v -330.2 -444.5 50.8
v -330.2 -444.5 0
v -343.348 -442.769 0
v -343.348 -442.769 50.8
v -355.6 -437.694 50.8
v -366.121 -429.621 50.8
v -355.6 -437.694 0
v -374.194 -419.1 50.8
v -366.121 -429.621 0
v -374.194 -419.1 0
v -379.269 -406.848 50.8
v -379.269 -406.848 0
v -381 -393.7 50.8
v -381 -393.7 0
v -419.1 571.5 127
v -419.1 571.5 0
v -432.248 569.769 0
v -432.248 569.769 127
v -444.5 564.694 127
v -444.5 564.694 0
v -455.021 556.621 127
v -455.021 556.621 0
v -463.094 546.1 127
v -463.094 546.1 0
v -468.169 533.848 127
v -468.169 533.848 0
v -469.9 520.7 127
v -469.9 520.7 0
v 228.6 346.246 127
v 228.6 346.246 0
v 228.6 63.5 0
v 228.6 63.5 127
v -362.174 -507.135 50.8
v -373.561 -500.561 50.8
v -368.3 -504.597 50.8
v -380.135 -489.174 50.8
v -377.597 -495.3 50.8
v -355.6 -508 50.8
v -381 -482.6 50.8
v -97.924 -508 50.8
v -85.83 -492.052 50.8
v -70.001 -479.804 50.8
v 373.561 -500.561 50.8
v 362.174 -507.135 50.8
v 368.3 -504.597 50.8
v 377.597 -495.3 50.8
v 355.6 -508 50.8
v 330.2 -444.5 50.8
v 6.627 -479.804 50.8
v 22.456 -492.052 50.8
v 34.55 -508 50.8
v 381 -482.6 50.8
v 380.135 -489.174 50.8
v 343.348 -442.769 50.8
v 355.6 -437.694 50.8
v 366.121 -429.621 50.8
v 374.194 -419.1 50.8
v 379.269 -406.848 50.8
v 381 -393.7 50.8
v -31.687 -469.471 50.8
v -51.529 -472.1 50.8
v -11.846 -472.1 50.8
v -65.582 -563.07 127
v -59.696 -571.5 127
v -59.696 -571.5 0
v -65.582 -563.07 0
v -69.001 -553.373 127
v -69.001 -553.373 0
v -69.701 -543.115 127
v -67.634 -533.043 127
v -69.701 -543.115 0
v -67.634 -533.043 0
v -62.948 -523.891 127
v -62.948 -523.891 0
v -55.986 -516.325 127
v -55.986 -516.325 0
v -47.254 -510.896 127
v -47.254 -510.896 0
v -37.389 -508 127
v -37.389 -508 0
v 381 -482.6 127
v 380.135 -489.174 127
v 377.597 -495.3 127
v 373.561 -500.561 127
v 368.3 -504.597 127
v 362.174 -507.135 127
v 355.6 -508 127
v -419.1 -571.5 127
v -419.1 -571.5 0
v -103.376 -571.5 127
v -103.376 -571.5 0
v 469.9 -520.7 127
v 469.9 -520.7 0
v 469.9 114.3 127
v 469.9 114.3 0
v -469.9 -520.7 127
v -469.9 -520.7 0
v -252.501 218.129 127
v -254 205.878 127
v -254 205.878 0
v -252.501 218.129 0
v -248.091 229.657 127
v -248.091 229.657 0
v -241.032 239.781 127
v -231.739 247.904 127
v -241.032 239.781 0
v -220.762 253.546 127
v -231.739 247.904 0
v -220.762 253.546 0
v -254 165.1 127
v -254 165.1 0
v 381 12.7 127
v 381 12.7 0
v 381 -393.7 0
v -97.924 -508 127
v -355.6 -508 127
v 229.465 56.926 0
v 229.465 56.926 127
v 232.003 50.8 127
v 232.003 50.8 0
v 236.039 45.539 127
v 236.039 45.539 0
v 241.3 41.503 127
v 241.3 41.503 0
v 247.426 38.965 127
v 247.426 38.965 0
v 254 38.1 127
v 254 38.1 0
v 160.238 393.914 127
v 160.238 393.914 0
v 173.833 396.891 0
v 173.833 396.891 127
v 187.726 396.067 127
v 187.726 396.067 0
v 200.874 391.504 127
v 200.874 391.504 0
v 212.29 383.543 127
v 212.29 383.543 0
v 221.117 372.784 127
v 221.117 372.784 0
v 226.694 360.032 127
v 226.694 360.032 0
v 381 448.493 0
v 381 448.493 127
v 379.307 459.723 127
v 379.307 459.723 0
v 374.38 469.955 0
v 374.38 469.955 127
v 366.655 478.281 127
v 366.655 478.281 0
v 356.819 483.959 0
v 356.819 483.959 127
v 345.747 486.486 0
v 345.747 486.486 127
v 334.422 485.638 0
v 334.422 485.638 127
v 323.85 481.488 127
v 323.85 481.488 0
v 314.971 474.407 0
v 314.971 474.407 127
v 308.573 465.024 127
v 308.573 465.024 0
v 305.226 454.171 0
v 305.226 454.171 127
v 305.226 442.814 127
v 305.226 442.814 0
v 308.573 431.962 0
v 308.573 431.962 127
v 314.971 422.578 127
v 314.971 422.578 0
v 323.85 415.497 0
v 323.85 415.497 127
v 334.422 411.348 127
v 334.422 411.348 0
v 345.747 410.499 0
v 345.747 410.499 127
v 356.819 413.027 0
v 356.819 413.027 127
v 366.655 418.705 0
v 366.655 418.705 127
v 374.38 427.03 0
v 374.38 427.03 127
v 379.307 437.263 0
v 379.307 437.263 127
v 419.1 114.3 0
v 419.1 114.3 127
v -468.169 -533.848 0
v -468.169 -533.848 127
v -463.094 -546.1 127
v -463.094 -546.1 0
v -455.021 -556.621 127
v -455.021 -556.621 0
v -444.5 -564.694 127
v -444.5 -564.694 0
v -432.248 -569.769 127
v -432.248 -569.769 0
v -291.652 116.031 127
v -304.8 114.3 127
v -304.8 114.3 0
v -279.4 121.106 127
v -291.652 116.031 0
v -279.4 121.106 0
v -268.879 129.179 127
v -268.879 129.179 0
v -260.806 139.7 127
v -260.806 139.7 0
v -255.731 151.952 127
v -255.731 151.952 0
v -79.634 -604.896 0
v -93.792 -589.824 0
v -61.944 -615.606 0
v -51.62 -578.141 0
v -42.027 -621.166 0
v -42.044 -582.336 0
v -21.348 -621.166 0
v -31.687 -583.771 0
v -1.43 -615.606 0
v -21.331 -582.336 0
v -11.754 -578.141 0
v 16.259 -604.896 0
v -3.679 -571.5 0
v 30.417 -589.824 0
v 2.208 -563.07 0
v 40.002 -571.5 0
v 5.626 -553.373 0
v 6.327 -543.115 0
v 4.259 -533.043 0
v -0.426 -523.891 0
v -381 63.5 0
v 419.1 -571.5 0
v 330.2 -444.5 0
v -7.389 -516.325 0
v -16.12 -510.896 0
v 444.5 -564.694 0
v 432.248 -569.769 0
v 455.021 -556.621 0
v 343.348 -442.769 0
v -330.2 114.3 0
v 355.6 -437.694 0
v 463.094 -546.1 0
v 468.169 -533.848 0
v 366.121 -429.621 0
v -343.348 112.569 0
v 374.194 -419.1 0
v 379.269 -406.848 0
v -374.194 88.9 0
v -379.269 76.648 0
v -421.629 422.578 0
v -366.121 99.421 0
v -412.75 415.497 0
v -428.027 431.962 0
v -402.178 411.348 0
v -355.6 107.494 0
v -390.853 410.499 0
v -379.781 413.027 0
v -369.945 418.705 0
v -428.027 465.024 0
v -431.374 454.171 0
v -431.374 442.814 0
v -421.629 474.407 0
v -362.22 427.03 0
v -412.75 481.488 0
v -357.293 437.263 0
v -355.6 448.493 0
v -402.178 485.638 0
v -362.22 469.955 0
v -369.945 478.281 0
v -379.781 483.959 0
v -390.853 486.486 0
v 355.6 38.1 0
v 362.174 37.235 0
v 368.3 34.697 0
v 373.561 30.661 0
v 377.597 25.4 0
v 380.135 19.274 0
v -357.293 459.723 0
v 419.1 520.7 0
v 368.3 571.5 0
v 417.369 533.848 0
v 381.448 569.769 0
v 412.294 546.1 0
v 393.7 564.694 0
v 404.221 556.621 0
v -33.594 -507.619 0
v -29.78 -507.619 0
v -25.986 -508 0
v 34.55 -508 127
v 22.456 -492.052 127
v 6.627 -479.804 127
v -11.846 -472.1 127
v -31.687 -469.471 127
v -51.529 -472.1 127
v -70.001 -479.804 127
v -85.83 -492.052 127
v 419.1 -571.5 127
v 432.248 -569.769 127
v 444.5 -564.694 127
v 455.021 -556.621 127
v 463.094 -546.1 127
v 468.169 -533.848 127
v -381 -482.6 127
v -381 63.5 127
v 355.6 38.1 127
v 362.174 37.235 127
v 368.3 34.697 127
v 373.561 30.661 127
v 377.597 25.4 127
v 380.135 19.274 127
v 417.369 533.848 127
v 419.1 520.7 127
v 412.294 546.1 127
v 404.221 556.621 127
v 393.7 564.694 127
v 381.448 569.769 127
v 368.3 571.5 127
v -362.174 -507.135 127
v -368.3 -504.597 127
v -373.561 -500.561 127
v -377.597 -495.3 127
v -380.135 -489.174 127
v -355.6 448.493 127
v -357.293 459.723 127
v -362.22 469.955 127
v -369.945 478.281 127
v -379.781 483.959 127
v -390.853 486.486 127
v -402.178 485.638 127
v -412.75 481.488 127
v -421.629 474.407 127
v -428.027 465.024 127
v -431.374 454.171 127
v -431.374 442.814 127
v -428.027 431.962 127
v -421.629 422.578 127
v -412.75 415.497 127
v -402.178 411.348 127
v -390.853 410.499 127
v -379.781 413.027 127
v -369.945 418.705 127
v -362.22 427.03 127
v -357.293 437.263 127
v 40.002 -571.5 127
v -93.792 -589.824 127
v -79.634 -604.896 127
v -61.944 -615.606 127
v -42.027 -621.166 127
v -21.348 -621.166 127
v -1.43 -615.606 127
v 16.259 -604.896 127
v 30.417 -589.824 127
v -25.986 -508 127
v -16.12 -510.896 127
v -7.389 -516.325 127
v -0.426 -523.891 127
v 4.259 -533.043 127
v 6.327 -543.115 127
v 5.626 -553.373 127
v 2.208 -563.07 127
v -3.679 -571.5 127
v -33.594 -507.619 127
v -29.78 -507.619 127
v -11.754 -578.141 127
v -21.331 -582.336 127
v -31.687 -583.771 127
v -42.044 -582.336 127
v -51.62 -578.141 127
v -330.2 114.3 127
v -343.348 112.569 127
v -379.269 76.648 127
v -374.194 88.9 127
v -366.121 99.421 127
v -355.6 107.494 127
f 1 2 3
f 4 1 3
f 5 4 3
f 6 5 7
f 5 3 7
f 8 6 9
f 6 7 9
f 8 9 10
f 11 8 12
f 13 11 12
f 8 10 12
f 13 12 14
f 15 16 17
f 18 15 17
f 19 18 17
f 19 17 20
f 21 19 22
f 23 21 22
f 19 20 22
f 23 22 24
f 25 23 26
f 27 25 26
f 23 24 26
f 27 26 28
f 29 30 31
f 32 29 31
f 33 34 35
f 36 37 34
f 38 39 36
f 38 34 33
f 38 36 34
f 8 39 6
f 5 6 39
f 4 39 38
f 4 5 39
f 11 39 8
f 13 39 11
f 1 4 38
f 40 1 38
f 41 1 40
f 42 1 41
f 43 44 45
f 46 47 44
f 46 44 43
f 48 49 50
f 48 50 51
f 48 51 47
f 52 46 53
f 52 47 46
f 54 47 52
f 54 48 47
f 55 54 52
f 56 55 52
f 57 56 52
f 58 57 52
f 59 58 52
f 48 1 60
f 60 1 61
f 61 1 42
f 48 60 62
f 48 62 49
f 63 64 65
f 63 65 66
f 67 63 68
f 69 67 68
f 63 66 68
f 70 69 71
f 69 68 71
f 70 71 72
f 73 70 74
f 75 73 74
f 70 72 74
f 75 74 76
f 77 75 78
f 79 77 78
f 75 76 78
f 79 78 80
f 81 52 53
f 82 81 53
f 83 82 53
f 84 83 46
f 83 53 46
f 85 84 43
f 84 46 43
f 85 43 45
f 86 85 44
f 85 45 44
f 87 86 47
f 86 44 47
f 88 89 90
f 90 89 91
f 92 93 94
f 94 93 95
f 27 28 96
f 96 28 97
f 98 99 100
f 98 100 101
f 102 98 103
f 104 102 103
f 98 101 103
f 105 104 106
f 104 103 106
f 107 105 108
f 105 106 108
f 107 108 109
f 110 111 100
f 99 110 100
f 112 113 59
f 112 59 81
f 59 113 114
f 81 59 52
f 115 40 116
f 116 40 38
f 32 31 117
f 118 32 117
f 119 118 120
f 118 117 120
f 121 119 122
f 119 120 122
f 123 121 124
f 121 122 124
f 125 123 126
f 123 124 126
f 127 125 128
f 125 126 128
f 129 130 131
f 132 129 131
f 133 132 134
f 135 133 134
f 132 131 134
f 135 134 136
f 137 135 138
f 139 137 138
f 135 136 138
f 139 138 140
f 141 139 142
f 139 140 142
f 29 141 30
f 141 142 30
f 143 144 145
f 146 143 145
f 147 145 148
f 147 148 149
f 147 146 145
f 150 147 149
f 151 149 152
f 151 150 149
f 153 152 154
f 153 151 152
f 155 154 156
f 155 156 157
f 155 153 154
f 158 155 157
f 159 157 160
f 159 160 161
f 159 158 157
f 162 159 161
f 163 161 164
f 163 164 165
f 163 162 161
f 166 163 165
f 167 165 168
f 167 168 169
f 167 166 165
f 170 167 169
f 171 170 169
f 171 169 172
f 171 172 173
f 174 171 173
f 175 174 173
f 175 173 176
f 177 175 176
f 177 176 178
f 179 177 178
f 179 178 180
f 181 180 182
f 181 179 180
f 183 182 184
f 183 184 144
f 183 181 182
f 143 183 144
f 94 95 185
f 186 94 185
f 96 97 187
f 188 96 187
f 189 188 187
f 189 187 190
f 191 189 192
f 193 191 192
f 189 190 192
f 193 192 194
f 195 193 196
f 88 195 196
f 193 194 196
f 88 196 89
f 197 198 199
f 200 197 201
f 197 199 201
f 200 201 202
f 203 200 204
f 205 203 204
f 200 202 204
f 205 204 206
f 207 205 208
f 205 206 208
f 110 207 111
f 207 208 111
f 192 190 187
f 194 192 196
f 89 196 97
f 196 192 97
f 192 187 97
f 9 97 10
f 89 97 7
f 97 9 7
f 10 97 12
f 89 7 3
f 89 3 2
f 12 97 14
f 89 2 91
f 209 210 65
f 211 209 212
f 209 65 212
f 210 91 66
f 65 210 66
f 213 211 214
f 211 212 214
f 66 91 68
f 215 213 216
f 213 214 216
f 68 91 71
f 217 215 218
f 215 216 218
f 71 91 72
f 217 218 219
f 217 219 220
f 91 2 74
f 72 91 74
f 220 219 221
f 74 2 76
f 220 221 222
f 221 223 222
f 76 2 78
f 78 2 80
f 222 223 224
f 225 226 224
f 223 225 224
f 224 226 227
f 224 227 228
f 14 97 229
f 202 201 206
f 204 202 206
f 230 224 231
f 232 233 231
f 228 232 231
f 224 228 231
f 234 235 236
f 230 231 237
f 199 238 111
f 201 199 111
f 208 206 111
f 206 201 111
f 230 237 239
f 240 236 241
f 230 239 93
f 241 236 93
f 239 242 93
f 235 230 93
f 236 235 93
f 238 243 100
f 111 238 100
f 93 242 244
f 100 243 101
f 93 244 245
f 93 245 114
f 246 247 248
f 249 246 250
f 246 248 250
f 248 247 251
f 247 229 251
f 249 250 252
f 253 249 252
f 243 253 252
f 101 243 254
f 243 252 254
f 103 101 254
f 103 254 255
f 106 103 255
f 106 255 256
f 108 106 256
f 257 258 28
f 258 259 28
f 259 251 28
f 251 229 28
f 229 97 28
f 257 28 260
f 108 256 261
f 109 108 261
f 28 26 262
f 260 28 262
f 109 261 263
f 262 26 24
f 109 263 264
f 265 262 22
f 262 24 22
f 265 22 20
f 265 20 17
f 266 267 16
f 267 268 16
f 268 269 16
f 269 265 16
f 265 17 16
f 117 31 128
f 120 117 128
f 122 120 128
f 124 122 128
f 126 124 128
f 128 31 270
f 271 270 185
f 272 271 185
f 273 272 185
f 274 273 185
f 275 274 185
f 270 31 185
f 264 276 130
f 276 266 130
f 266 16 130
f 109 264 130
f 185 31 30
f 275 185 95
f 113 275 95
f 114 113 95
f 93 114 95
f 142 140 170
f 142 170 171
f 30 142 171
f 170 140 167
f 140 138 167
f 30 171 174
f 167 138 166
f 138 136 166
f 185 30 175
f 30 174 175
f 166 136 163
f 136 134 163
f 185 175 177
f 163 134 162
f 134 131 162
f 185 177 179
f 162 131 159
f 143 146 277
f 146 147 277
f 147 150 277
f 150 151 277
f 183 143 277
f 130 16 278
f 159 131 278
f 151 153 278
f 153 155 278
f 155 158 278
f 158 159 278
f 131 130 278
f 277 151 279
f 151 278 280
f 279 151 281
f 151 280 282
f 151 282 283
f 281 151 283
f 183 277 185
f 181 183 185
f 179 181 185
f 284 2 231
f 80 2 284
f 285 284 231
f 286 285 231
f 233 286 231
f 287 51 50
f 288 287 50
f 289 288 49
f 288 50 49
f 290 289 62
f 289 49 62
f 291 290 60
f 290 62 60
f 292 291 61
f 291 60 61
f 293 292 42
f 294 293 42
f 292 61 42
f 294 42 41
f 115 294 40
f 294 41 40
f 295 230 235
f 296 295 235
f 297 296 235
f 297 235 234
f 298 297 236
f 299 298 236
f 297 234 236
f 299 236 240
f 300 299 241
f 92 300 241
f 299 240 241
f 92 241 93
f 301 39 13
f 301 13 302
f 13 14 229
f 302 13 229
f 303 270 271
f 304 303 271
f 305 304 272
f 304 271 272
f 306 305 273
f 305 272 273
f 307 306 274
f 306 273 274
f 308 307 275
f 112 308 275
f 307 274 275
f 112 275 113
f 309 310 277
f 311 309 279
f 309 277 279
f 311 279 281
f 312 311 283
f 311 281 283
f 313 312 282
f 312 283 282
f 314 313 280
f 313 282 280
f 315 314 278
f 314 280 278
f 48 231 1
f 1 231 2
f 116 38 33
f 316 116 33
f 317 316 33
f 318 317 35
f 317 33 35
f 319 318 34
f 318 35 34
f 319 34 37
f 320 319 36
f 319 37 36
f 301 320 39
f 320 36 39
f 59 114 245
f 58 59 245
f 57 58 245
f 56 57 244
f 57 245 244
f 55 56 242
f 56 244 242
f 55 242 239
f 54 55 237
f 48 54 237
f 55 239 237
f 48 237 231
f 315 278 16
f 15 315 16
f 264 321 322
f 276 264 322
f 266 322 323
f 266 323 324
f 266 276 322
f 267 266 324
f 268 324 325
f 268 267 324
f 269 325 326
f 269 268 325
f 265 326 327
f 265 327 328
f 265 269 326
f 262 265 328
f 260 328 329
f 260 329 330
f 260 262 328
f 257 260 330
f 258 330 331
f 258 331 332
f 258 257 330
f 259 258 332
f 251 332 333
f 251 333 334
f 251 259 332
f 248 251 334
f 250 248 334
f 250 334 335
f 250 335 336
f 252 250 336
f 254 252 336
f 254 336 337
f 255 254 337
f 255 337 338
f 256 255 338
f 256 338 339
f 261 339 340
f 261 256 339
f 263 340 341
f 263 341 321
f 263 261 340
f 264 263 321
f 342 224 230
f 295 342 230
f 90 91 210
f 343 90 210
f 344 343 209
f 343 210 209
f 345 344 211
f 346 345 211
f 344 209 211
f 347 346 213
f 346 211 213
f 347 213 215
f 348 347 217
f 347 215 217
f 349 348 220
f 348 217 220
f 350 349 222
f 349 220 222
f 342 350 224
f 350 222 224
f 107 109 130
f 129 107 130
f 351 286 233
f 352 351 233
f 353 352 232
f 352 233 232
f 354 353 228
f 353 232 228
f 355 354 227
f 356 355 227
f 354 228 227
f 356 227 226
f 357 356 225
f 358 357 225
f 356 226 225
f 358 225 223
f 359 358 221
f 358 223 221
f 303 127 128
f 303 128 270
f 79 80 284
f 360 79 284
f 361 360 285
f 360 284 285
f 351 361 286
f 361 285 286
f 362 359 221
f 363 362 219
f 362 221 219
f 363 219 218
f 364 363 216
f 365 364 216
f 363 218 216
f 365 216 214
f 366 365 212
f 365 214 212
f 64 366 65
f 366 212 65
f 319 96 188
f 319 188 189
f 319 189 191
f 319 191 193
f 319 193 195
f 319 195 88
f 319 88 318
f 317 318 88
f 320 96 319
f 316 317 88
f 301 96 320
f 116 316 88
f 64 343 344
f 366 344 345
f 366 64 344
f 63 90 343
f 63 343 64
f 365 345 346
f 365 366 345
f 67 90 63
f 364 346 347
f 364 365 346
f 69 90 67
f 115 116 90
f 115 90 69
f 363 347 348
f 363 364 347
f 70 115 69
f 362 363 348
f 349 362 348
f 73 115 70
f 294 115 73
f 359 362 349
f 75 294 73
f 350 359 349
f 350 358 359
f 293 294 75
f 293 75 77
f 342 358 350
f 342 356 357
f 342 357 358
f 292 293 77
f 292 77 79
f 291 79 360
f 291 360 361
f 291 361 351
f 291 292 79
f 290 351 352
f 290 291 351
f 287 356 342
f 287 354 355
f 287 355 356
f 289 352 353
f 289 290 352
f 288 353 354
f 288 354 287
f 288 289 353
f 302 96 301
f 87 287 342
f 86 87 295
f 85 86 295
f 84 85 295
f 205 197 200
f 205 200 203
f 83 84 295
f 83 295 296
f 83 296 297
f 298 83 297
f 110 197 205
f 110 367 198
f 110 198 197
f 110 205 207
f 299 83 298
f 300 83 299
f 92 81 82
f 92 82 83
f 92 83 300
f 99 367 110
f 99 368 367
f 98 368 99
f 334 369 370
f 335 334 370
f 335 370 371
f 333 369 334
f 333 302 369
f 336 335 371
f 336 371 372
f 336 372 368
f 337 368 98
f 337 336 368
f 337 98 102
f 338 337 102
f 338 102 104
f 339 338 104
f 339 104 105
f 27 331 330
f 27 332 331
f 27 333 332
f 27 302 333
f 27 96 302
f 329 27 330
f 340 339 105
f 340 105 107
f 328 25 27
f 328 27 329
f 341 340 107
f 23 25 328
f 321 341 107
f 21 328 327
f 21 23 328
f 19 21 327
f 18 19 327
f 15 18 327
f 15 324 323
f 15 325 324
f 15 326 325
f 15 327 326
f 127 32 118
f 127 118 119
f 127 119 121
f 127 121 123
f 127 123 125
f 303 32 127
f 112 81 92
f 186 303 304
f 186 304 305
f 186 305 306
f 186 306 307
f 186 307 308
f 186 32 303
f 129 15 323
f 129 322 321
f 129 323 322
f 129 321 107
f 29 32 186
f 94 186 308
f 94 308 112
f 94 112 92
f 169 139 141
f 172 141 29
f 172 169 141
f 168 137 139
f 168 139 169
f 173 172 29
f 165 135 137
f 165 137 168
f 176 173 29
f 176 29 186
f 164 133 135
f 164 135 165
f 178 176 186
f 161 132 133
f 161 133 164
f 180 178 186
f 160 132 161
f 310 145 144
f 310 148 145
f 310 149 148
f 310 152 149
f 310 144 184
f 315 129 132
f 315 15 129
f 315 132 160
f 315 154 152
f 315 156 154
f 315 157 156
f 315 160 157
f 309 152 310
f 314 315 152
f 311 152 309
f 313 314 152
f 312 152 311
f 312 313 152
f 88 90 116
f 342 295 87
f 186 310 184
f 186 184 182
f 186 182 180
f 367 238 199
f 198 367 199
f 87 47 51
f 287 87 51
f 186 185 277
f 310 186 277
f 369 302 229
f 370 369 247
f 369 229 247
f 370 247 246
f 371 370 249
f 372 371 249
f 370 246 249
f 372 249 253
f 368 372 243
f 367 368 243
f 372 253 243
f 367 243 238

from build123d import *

# Parameters (mm, degrees)
F1_DEPTH = 50.8
F0_R     = 76.2
F0_R_2   = 38.1
F2_DEPTH = 127


with BuildPart() as f1:
    # F0 (on Top) → F1 (new body)
    with BuildSketch(Plane.XY):
        with BuildLine():
            Line((-355.6, -508), (-97.9242677745, -508))
            ThreePointArc((-97.9242677745, -508), (-31.6872932017, -469.4709861755), (34.5496813712, -508))
            Line((34.5496813712, -508), (355.6, -508))
            ThreePointArc((355.6, -508), (373.5605122421, -500.5605122421), (381, -482.6))
            Line((381, -482.6), (381, -393.7))
            ThreePointArc((381, -393.7), (366.1210244843, -429.6210244843), (330.2, -444.5))
            Line((330.2, -444.5), (-330.2, -444.5))
            ThreePointArc((-330.2, -444.5), (-366.1210244843, -429.6210244843), (-381, -393.7))
            Line((-381, -393.7), (-381, -482.6))
            ThreePointArc((-381, -482.6), (-373.5605122421, -500.5605122421), (-355.6, -508))
        make_face()
    extrude(amount=F1_DEPTH)

    # F0 (on Top) → F2 (join)
    with BuildSketch(Plane.XY):
        with BuildLine():
            ThreePointArc((419.1, 520.7), (404.2210244843, 556.6210244843), (368.3, 571.5))
            Line((368.3, 571.5), (-419.1, 571.5))
            ThreePointArc((-419.1, 571.5), (-455.0210244843, 556.6210244843), (-469.9, 520.7))
            Line((-469.9, 520.7), (-469.9, 448.4929144382))
            Line((-469.9, 448.4929144382), (-469.9, -520.7))
            ThreePointArc((-469.9, -520.7), (-455.0210244843, -556.6210244843), (-419.1, -571.5))
            Line((-419.1, -571.5), (-103.3762187401, -571.5))
            ThreePointArc((-103.3762187401, -571.5), (-107.6079819524, -539.1526259812), (-97.9242677745, -508))
            Line((-97.9242677745, -508), (-355.6, -508))
            ThreePointArc((-355.6, -508), (-373.5605122421, -500.5605122421), (-381, -482.6))
            Line((-381, -482.6), (-381, -393.7))
            Line((-381, -393.7), (-381, 63.5))
            ThreePointArc((-381, 63.5), (-366.1210244843, 99.4210244843), (-330.2, 114.3))
            Line((-330.2, 114.3), (-304.8, 114.3))
            ThreePointArc((-304.8, 114.3), (-268.8789755157, 129.1789755157), (-254, 165.1))
            Line((-254, 165.1), (-254, 205.8778104236))
            ThreePointArc((-254, 205.8778104236), (-244.8700196616, 234.9337816068), (-220.7618322284, 253.5456407579))
            Line((-220.7618322284, 253.5456407579), (160.2381677716, 393.9140618106))
            ThreePointArc((160.2381677716, 393.9140618106), (206.8559711832, 387.9162511379), (228.6, 346.2462314763))
            Line((228.6, 346.2462314763), (228.6, 63.5))
            ThreePointArc((228.6, 63.5), (236.0394877579, 45.5394877579), (254, 38.1))
            Line((254, 38.1), (355.6, 38.1))
            ThreePointArc((355.6, 38.1), (373.5605122421, 30.6605122421), (381, 12.7))
            Line((381, 12.7), (381, -393.7))
            Line((381, -393.7), (381, -482.6))
            ThreePointArc((381, -482.6), (373.5605122421, -500.5605122421), (355.6, -508))
            Line((355.6, -508), (34.5496813712, -508))
            ThreePointArc((34.5496813712, -508), (41.9798550479, -526.1878840413), (44.5127067983, -545.6709861755))
            ThreePointArc((44.5127067983, -545.6709861755), (43.3764667828, -558.7809799584), (40.0016323368, -571.5))
            Line((40.0016323368, -571.5), (419.1, -571.5))
            ThreePointArc((419.1, -571.5), (455.0210244843, -556.6210244843), (469.9, -520.7))
            Line((469.9, -520.7), (469.9, 114.3))
            Line((469.9, 114.3), (419.1, 114.3))
            Line((419.1, 114.3), (419.1, 448.4929144382))
            Line((419.1, 448.4929144382), (419.1, 520.7))
        make_face()
        with BuildLine():
            ThreePointArc((-317.5, 448.4929144382), (-393.7, 372.2929144382), (-469.9, 448.4929144382))
            ThreePointArc((-469.9, 448.4929144382), (-393.7, 524.6929144382), (-317.5, 448.4929144382))
        make_face(mode=Mode.SUBTRACT)
        with Locations((342.9, 448.4929144382)):
            Circle(F0_R, mode=Mode.SUBTRACT)
        with BuildLine():
            ThreePointArc((-317.5, 448.4929144382), (-393.7, 524.6929144382), (-469.9, 448.4929144382))
            ThreePointArc((-469.9, 448.4929144382), (-393.7, 372.2929144382), (-317.5, 448.4929144382))
        make_face()
        with Locations((-393.7, 448.4929144382)):
            Circle(F0_R_2, mode=Mode.SUBTRACT)
        with Locations((342.9, 448.4929144382)):
            Circle(F0_R)
        with Locations((342.9, 448.4929144382)):
            Circle(F0_R_2, mode=Mode.SUBTRACT)
        with BuildLine():
            Line((-3.6788650977, -571.5), (40.0016323368, -571.5))
            ThreePointArc((40.0016323368, -571.5), (43.3764667828, -558.7809799584), (44.5127067983, -545.6709861755))
            ThreePointArc((44.5127067983, -545.6709861755), (41.9798550479, -526.1878840413), (34.5496813712, -508))
            Line((34.5496813712, -508), (-25.9858196586, -508))
            ThreePointArc((-25.9858196586, -508), (-2.8009976449, -520.8276383938), (6.4127067983, -545.6709861755))
            ThreePointArc((6.4127067983, -545.6709861755), (3.8002476455, -559.5362104658), (-3.6788650977, -571.5))
        make_face()
        with BuildLine():
            ThreePointArc((34.5496813712, -508), (-31.6872932017, -469.4709861755), (-97.9242677745, -508))
            Line((-97.9242677745, -508), (-37.3887667448, -508))
            ThreePointArc((-37.3887667448, -508), (-31.6872932017, -507.5709861755), (-25.9858196586, -508))
            Line((-25.9858196586, -508), (34.5496813712, -508))
        make_face()
        with BuildLine():
            ThreePointArc((-97.9242677745, -508), (-107.6079819524, -539.1526259812), (-103.3762187401, -571.5))
            Line((-103.3762187401, -571.5), (-59.6957213057, -571.5))
            ThreePointArc((-59.6957213057, -571.5), (-67.633807181, -533.0433128848), (-37.3887667448, -508))
            Line((-37.3887667448, -508), (-97.9242677745, -508))
        make_face()
        with BuildLine():
            Line((-59.6957213057, -571.5), (-103.3762187401, -571.5))
            ThreePointArc((-103.3762187401, -571.5), (-31.6872932017, -621.8709861755), (40.0016323368, -571.5))
            Line((40.0016323368, -571.5), (-3.6788650977, -571.5))
            ThreePointArc((-3.6788650977, -571.5), (-31.6872932017, -583.7709861755), (-59.6957213057, -571.5))
        make_face()
    extrude(amount=F2_DEPTH)


solid = f1.part
